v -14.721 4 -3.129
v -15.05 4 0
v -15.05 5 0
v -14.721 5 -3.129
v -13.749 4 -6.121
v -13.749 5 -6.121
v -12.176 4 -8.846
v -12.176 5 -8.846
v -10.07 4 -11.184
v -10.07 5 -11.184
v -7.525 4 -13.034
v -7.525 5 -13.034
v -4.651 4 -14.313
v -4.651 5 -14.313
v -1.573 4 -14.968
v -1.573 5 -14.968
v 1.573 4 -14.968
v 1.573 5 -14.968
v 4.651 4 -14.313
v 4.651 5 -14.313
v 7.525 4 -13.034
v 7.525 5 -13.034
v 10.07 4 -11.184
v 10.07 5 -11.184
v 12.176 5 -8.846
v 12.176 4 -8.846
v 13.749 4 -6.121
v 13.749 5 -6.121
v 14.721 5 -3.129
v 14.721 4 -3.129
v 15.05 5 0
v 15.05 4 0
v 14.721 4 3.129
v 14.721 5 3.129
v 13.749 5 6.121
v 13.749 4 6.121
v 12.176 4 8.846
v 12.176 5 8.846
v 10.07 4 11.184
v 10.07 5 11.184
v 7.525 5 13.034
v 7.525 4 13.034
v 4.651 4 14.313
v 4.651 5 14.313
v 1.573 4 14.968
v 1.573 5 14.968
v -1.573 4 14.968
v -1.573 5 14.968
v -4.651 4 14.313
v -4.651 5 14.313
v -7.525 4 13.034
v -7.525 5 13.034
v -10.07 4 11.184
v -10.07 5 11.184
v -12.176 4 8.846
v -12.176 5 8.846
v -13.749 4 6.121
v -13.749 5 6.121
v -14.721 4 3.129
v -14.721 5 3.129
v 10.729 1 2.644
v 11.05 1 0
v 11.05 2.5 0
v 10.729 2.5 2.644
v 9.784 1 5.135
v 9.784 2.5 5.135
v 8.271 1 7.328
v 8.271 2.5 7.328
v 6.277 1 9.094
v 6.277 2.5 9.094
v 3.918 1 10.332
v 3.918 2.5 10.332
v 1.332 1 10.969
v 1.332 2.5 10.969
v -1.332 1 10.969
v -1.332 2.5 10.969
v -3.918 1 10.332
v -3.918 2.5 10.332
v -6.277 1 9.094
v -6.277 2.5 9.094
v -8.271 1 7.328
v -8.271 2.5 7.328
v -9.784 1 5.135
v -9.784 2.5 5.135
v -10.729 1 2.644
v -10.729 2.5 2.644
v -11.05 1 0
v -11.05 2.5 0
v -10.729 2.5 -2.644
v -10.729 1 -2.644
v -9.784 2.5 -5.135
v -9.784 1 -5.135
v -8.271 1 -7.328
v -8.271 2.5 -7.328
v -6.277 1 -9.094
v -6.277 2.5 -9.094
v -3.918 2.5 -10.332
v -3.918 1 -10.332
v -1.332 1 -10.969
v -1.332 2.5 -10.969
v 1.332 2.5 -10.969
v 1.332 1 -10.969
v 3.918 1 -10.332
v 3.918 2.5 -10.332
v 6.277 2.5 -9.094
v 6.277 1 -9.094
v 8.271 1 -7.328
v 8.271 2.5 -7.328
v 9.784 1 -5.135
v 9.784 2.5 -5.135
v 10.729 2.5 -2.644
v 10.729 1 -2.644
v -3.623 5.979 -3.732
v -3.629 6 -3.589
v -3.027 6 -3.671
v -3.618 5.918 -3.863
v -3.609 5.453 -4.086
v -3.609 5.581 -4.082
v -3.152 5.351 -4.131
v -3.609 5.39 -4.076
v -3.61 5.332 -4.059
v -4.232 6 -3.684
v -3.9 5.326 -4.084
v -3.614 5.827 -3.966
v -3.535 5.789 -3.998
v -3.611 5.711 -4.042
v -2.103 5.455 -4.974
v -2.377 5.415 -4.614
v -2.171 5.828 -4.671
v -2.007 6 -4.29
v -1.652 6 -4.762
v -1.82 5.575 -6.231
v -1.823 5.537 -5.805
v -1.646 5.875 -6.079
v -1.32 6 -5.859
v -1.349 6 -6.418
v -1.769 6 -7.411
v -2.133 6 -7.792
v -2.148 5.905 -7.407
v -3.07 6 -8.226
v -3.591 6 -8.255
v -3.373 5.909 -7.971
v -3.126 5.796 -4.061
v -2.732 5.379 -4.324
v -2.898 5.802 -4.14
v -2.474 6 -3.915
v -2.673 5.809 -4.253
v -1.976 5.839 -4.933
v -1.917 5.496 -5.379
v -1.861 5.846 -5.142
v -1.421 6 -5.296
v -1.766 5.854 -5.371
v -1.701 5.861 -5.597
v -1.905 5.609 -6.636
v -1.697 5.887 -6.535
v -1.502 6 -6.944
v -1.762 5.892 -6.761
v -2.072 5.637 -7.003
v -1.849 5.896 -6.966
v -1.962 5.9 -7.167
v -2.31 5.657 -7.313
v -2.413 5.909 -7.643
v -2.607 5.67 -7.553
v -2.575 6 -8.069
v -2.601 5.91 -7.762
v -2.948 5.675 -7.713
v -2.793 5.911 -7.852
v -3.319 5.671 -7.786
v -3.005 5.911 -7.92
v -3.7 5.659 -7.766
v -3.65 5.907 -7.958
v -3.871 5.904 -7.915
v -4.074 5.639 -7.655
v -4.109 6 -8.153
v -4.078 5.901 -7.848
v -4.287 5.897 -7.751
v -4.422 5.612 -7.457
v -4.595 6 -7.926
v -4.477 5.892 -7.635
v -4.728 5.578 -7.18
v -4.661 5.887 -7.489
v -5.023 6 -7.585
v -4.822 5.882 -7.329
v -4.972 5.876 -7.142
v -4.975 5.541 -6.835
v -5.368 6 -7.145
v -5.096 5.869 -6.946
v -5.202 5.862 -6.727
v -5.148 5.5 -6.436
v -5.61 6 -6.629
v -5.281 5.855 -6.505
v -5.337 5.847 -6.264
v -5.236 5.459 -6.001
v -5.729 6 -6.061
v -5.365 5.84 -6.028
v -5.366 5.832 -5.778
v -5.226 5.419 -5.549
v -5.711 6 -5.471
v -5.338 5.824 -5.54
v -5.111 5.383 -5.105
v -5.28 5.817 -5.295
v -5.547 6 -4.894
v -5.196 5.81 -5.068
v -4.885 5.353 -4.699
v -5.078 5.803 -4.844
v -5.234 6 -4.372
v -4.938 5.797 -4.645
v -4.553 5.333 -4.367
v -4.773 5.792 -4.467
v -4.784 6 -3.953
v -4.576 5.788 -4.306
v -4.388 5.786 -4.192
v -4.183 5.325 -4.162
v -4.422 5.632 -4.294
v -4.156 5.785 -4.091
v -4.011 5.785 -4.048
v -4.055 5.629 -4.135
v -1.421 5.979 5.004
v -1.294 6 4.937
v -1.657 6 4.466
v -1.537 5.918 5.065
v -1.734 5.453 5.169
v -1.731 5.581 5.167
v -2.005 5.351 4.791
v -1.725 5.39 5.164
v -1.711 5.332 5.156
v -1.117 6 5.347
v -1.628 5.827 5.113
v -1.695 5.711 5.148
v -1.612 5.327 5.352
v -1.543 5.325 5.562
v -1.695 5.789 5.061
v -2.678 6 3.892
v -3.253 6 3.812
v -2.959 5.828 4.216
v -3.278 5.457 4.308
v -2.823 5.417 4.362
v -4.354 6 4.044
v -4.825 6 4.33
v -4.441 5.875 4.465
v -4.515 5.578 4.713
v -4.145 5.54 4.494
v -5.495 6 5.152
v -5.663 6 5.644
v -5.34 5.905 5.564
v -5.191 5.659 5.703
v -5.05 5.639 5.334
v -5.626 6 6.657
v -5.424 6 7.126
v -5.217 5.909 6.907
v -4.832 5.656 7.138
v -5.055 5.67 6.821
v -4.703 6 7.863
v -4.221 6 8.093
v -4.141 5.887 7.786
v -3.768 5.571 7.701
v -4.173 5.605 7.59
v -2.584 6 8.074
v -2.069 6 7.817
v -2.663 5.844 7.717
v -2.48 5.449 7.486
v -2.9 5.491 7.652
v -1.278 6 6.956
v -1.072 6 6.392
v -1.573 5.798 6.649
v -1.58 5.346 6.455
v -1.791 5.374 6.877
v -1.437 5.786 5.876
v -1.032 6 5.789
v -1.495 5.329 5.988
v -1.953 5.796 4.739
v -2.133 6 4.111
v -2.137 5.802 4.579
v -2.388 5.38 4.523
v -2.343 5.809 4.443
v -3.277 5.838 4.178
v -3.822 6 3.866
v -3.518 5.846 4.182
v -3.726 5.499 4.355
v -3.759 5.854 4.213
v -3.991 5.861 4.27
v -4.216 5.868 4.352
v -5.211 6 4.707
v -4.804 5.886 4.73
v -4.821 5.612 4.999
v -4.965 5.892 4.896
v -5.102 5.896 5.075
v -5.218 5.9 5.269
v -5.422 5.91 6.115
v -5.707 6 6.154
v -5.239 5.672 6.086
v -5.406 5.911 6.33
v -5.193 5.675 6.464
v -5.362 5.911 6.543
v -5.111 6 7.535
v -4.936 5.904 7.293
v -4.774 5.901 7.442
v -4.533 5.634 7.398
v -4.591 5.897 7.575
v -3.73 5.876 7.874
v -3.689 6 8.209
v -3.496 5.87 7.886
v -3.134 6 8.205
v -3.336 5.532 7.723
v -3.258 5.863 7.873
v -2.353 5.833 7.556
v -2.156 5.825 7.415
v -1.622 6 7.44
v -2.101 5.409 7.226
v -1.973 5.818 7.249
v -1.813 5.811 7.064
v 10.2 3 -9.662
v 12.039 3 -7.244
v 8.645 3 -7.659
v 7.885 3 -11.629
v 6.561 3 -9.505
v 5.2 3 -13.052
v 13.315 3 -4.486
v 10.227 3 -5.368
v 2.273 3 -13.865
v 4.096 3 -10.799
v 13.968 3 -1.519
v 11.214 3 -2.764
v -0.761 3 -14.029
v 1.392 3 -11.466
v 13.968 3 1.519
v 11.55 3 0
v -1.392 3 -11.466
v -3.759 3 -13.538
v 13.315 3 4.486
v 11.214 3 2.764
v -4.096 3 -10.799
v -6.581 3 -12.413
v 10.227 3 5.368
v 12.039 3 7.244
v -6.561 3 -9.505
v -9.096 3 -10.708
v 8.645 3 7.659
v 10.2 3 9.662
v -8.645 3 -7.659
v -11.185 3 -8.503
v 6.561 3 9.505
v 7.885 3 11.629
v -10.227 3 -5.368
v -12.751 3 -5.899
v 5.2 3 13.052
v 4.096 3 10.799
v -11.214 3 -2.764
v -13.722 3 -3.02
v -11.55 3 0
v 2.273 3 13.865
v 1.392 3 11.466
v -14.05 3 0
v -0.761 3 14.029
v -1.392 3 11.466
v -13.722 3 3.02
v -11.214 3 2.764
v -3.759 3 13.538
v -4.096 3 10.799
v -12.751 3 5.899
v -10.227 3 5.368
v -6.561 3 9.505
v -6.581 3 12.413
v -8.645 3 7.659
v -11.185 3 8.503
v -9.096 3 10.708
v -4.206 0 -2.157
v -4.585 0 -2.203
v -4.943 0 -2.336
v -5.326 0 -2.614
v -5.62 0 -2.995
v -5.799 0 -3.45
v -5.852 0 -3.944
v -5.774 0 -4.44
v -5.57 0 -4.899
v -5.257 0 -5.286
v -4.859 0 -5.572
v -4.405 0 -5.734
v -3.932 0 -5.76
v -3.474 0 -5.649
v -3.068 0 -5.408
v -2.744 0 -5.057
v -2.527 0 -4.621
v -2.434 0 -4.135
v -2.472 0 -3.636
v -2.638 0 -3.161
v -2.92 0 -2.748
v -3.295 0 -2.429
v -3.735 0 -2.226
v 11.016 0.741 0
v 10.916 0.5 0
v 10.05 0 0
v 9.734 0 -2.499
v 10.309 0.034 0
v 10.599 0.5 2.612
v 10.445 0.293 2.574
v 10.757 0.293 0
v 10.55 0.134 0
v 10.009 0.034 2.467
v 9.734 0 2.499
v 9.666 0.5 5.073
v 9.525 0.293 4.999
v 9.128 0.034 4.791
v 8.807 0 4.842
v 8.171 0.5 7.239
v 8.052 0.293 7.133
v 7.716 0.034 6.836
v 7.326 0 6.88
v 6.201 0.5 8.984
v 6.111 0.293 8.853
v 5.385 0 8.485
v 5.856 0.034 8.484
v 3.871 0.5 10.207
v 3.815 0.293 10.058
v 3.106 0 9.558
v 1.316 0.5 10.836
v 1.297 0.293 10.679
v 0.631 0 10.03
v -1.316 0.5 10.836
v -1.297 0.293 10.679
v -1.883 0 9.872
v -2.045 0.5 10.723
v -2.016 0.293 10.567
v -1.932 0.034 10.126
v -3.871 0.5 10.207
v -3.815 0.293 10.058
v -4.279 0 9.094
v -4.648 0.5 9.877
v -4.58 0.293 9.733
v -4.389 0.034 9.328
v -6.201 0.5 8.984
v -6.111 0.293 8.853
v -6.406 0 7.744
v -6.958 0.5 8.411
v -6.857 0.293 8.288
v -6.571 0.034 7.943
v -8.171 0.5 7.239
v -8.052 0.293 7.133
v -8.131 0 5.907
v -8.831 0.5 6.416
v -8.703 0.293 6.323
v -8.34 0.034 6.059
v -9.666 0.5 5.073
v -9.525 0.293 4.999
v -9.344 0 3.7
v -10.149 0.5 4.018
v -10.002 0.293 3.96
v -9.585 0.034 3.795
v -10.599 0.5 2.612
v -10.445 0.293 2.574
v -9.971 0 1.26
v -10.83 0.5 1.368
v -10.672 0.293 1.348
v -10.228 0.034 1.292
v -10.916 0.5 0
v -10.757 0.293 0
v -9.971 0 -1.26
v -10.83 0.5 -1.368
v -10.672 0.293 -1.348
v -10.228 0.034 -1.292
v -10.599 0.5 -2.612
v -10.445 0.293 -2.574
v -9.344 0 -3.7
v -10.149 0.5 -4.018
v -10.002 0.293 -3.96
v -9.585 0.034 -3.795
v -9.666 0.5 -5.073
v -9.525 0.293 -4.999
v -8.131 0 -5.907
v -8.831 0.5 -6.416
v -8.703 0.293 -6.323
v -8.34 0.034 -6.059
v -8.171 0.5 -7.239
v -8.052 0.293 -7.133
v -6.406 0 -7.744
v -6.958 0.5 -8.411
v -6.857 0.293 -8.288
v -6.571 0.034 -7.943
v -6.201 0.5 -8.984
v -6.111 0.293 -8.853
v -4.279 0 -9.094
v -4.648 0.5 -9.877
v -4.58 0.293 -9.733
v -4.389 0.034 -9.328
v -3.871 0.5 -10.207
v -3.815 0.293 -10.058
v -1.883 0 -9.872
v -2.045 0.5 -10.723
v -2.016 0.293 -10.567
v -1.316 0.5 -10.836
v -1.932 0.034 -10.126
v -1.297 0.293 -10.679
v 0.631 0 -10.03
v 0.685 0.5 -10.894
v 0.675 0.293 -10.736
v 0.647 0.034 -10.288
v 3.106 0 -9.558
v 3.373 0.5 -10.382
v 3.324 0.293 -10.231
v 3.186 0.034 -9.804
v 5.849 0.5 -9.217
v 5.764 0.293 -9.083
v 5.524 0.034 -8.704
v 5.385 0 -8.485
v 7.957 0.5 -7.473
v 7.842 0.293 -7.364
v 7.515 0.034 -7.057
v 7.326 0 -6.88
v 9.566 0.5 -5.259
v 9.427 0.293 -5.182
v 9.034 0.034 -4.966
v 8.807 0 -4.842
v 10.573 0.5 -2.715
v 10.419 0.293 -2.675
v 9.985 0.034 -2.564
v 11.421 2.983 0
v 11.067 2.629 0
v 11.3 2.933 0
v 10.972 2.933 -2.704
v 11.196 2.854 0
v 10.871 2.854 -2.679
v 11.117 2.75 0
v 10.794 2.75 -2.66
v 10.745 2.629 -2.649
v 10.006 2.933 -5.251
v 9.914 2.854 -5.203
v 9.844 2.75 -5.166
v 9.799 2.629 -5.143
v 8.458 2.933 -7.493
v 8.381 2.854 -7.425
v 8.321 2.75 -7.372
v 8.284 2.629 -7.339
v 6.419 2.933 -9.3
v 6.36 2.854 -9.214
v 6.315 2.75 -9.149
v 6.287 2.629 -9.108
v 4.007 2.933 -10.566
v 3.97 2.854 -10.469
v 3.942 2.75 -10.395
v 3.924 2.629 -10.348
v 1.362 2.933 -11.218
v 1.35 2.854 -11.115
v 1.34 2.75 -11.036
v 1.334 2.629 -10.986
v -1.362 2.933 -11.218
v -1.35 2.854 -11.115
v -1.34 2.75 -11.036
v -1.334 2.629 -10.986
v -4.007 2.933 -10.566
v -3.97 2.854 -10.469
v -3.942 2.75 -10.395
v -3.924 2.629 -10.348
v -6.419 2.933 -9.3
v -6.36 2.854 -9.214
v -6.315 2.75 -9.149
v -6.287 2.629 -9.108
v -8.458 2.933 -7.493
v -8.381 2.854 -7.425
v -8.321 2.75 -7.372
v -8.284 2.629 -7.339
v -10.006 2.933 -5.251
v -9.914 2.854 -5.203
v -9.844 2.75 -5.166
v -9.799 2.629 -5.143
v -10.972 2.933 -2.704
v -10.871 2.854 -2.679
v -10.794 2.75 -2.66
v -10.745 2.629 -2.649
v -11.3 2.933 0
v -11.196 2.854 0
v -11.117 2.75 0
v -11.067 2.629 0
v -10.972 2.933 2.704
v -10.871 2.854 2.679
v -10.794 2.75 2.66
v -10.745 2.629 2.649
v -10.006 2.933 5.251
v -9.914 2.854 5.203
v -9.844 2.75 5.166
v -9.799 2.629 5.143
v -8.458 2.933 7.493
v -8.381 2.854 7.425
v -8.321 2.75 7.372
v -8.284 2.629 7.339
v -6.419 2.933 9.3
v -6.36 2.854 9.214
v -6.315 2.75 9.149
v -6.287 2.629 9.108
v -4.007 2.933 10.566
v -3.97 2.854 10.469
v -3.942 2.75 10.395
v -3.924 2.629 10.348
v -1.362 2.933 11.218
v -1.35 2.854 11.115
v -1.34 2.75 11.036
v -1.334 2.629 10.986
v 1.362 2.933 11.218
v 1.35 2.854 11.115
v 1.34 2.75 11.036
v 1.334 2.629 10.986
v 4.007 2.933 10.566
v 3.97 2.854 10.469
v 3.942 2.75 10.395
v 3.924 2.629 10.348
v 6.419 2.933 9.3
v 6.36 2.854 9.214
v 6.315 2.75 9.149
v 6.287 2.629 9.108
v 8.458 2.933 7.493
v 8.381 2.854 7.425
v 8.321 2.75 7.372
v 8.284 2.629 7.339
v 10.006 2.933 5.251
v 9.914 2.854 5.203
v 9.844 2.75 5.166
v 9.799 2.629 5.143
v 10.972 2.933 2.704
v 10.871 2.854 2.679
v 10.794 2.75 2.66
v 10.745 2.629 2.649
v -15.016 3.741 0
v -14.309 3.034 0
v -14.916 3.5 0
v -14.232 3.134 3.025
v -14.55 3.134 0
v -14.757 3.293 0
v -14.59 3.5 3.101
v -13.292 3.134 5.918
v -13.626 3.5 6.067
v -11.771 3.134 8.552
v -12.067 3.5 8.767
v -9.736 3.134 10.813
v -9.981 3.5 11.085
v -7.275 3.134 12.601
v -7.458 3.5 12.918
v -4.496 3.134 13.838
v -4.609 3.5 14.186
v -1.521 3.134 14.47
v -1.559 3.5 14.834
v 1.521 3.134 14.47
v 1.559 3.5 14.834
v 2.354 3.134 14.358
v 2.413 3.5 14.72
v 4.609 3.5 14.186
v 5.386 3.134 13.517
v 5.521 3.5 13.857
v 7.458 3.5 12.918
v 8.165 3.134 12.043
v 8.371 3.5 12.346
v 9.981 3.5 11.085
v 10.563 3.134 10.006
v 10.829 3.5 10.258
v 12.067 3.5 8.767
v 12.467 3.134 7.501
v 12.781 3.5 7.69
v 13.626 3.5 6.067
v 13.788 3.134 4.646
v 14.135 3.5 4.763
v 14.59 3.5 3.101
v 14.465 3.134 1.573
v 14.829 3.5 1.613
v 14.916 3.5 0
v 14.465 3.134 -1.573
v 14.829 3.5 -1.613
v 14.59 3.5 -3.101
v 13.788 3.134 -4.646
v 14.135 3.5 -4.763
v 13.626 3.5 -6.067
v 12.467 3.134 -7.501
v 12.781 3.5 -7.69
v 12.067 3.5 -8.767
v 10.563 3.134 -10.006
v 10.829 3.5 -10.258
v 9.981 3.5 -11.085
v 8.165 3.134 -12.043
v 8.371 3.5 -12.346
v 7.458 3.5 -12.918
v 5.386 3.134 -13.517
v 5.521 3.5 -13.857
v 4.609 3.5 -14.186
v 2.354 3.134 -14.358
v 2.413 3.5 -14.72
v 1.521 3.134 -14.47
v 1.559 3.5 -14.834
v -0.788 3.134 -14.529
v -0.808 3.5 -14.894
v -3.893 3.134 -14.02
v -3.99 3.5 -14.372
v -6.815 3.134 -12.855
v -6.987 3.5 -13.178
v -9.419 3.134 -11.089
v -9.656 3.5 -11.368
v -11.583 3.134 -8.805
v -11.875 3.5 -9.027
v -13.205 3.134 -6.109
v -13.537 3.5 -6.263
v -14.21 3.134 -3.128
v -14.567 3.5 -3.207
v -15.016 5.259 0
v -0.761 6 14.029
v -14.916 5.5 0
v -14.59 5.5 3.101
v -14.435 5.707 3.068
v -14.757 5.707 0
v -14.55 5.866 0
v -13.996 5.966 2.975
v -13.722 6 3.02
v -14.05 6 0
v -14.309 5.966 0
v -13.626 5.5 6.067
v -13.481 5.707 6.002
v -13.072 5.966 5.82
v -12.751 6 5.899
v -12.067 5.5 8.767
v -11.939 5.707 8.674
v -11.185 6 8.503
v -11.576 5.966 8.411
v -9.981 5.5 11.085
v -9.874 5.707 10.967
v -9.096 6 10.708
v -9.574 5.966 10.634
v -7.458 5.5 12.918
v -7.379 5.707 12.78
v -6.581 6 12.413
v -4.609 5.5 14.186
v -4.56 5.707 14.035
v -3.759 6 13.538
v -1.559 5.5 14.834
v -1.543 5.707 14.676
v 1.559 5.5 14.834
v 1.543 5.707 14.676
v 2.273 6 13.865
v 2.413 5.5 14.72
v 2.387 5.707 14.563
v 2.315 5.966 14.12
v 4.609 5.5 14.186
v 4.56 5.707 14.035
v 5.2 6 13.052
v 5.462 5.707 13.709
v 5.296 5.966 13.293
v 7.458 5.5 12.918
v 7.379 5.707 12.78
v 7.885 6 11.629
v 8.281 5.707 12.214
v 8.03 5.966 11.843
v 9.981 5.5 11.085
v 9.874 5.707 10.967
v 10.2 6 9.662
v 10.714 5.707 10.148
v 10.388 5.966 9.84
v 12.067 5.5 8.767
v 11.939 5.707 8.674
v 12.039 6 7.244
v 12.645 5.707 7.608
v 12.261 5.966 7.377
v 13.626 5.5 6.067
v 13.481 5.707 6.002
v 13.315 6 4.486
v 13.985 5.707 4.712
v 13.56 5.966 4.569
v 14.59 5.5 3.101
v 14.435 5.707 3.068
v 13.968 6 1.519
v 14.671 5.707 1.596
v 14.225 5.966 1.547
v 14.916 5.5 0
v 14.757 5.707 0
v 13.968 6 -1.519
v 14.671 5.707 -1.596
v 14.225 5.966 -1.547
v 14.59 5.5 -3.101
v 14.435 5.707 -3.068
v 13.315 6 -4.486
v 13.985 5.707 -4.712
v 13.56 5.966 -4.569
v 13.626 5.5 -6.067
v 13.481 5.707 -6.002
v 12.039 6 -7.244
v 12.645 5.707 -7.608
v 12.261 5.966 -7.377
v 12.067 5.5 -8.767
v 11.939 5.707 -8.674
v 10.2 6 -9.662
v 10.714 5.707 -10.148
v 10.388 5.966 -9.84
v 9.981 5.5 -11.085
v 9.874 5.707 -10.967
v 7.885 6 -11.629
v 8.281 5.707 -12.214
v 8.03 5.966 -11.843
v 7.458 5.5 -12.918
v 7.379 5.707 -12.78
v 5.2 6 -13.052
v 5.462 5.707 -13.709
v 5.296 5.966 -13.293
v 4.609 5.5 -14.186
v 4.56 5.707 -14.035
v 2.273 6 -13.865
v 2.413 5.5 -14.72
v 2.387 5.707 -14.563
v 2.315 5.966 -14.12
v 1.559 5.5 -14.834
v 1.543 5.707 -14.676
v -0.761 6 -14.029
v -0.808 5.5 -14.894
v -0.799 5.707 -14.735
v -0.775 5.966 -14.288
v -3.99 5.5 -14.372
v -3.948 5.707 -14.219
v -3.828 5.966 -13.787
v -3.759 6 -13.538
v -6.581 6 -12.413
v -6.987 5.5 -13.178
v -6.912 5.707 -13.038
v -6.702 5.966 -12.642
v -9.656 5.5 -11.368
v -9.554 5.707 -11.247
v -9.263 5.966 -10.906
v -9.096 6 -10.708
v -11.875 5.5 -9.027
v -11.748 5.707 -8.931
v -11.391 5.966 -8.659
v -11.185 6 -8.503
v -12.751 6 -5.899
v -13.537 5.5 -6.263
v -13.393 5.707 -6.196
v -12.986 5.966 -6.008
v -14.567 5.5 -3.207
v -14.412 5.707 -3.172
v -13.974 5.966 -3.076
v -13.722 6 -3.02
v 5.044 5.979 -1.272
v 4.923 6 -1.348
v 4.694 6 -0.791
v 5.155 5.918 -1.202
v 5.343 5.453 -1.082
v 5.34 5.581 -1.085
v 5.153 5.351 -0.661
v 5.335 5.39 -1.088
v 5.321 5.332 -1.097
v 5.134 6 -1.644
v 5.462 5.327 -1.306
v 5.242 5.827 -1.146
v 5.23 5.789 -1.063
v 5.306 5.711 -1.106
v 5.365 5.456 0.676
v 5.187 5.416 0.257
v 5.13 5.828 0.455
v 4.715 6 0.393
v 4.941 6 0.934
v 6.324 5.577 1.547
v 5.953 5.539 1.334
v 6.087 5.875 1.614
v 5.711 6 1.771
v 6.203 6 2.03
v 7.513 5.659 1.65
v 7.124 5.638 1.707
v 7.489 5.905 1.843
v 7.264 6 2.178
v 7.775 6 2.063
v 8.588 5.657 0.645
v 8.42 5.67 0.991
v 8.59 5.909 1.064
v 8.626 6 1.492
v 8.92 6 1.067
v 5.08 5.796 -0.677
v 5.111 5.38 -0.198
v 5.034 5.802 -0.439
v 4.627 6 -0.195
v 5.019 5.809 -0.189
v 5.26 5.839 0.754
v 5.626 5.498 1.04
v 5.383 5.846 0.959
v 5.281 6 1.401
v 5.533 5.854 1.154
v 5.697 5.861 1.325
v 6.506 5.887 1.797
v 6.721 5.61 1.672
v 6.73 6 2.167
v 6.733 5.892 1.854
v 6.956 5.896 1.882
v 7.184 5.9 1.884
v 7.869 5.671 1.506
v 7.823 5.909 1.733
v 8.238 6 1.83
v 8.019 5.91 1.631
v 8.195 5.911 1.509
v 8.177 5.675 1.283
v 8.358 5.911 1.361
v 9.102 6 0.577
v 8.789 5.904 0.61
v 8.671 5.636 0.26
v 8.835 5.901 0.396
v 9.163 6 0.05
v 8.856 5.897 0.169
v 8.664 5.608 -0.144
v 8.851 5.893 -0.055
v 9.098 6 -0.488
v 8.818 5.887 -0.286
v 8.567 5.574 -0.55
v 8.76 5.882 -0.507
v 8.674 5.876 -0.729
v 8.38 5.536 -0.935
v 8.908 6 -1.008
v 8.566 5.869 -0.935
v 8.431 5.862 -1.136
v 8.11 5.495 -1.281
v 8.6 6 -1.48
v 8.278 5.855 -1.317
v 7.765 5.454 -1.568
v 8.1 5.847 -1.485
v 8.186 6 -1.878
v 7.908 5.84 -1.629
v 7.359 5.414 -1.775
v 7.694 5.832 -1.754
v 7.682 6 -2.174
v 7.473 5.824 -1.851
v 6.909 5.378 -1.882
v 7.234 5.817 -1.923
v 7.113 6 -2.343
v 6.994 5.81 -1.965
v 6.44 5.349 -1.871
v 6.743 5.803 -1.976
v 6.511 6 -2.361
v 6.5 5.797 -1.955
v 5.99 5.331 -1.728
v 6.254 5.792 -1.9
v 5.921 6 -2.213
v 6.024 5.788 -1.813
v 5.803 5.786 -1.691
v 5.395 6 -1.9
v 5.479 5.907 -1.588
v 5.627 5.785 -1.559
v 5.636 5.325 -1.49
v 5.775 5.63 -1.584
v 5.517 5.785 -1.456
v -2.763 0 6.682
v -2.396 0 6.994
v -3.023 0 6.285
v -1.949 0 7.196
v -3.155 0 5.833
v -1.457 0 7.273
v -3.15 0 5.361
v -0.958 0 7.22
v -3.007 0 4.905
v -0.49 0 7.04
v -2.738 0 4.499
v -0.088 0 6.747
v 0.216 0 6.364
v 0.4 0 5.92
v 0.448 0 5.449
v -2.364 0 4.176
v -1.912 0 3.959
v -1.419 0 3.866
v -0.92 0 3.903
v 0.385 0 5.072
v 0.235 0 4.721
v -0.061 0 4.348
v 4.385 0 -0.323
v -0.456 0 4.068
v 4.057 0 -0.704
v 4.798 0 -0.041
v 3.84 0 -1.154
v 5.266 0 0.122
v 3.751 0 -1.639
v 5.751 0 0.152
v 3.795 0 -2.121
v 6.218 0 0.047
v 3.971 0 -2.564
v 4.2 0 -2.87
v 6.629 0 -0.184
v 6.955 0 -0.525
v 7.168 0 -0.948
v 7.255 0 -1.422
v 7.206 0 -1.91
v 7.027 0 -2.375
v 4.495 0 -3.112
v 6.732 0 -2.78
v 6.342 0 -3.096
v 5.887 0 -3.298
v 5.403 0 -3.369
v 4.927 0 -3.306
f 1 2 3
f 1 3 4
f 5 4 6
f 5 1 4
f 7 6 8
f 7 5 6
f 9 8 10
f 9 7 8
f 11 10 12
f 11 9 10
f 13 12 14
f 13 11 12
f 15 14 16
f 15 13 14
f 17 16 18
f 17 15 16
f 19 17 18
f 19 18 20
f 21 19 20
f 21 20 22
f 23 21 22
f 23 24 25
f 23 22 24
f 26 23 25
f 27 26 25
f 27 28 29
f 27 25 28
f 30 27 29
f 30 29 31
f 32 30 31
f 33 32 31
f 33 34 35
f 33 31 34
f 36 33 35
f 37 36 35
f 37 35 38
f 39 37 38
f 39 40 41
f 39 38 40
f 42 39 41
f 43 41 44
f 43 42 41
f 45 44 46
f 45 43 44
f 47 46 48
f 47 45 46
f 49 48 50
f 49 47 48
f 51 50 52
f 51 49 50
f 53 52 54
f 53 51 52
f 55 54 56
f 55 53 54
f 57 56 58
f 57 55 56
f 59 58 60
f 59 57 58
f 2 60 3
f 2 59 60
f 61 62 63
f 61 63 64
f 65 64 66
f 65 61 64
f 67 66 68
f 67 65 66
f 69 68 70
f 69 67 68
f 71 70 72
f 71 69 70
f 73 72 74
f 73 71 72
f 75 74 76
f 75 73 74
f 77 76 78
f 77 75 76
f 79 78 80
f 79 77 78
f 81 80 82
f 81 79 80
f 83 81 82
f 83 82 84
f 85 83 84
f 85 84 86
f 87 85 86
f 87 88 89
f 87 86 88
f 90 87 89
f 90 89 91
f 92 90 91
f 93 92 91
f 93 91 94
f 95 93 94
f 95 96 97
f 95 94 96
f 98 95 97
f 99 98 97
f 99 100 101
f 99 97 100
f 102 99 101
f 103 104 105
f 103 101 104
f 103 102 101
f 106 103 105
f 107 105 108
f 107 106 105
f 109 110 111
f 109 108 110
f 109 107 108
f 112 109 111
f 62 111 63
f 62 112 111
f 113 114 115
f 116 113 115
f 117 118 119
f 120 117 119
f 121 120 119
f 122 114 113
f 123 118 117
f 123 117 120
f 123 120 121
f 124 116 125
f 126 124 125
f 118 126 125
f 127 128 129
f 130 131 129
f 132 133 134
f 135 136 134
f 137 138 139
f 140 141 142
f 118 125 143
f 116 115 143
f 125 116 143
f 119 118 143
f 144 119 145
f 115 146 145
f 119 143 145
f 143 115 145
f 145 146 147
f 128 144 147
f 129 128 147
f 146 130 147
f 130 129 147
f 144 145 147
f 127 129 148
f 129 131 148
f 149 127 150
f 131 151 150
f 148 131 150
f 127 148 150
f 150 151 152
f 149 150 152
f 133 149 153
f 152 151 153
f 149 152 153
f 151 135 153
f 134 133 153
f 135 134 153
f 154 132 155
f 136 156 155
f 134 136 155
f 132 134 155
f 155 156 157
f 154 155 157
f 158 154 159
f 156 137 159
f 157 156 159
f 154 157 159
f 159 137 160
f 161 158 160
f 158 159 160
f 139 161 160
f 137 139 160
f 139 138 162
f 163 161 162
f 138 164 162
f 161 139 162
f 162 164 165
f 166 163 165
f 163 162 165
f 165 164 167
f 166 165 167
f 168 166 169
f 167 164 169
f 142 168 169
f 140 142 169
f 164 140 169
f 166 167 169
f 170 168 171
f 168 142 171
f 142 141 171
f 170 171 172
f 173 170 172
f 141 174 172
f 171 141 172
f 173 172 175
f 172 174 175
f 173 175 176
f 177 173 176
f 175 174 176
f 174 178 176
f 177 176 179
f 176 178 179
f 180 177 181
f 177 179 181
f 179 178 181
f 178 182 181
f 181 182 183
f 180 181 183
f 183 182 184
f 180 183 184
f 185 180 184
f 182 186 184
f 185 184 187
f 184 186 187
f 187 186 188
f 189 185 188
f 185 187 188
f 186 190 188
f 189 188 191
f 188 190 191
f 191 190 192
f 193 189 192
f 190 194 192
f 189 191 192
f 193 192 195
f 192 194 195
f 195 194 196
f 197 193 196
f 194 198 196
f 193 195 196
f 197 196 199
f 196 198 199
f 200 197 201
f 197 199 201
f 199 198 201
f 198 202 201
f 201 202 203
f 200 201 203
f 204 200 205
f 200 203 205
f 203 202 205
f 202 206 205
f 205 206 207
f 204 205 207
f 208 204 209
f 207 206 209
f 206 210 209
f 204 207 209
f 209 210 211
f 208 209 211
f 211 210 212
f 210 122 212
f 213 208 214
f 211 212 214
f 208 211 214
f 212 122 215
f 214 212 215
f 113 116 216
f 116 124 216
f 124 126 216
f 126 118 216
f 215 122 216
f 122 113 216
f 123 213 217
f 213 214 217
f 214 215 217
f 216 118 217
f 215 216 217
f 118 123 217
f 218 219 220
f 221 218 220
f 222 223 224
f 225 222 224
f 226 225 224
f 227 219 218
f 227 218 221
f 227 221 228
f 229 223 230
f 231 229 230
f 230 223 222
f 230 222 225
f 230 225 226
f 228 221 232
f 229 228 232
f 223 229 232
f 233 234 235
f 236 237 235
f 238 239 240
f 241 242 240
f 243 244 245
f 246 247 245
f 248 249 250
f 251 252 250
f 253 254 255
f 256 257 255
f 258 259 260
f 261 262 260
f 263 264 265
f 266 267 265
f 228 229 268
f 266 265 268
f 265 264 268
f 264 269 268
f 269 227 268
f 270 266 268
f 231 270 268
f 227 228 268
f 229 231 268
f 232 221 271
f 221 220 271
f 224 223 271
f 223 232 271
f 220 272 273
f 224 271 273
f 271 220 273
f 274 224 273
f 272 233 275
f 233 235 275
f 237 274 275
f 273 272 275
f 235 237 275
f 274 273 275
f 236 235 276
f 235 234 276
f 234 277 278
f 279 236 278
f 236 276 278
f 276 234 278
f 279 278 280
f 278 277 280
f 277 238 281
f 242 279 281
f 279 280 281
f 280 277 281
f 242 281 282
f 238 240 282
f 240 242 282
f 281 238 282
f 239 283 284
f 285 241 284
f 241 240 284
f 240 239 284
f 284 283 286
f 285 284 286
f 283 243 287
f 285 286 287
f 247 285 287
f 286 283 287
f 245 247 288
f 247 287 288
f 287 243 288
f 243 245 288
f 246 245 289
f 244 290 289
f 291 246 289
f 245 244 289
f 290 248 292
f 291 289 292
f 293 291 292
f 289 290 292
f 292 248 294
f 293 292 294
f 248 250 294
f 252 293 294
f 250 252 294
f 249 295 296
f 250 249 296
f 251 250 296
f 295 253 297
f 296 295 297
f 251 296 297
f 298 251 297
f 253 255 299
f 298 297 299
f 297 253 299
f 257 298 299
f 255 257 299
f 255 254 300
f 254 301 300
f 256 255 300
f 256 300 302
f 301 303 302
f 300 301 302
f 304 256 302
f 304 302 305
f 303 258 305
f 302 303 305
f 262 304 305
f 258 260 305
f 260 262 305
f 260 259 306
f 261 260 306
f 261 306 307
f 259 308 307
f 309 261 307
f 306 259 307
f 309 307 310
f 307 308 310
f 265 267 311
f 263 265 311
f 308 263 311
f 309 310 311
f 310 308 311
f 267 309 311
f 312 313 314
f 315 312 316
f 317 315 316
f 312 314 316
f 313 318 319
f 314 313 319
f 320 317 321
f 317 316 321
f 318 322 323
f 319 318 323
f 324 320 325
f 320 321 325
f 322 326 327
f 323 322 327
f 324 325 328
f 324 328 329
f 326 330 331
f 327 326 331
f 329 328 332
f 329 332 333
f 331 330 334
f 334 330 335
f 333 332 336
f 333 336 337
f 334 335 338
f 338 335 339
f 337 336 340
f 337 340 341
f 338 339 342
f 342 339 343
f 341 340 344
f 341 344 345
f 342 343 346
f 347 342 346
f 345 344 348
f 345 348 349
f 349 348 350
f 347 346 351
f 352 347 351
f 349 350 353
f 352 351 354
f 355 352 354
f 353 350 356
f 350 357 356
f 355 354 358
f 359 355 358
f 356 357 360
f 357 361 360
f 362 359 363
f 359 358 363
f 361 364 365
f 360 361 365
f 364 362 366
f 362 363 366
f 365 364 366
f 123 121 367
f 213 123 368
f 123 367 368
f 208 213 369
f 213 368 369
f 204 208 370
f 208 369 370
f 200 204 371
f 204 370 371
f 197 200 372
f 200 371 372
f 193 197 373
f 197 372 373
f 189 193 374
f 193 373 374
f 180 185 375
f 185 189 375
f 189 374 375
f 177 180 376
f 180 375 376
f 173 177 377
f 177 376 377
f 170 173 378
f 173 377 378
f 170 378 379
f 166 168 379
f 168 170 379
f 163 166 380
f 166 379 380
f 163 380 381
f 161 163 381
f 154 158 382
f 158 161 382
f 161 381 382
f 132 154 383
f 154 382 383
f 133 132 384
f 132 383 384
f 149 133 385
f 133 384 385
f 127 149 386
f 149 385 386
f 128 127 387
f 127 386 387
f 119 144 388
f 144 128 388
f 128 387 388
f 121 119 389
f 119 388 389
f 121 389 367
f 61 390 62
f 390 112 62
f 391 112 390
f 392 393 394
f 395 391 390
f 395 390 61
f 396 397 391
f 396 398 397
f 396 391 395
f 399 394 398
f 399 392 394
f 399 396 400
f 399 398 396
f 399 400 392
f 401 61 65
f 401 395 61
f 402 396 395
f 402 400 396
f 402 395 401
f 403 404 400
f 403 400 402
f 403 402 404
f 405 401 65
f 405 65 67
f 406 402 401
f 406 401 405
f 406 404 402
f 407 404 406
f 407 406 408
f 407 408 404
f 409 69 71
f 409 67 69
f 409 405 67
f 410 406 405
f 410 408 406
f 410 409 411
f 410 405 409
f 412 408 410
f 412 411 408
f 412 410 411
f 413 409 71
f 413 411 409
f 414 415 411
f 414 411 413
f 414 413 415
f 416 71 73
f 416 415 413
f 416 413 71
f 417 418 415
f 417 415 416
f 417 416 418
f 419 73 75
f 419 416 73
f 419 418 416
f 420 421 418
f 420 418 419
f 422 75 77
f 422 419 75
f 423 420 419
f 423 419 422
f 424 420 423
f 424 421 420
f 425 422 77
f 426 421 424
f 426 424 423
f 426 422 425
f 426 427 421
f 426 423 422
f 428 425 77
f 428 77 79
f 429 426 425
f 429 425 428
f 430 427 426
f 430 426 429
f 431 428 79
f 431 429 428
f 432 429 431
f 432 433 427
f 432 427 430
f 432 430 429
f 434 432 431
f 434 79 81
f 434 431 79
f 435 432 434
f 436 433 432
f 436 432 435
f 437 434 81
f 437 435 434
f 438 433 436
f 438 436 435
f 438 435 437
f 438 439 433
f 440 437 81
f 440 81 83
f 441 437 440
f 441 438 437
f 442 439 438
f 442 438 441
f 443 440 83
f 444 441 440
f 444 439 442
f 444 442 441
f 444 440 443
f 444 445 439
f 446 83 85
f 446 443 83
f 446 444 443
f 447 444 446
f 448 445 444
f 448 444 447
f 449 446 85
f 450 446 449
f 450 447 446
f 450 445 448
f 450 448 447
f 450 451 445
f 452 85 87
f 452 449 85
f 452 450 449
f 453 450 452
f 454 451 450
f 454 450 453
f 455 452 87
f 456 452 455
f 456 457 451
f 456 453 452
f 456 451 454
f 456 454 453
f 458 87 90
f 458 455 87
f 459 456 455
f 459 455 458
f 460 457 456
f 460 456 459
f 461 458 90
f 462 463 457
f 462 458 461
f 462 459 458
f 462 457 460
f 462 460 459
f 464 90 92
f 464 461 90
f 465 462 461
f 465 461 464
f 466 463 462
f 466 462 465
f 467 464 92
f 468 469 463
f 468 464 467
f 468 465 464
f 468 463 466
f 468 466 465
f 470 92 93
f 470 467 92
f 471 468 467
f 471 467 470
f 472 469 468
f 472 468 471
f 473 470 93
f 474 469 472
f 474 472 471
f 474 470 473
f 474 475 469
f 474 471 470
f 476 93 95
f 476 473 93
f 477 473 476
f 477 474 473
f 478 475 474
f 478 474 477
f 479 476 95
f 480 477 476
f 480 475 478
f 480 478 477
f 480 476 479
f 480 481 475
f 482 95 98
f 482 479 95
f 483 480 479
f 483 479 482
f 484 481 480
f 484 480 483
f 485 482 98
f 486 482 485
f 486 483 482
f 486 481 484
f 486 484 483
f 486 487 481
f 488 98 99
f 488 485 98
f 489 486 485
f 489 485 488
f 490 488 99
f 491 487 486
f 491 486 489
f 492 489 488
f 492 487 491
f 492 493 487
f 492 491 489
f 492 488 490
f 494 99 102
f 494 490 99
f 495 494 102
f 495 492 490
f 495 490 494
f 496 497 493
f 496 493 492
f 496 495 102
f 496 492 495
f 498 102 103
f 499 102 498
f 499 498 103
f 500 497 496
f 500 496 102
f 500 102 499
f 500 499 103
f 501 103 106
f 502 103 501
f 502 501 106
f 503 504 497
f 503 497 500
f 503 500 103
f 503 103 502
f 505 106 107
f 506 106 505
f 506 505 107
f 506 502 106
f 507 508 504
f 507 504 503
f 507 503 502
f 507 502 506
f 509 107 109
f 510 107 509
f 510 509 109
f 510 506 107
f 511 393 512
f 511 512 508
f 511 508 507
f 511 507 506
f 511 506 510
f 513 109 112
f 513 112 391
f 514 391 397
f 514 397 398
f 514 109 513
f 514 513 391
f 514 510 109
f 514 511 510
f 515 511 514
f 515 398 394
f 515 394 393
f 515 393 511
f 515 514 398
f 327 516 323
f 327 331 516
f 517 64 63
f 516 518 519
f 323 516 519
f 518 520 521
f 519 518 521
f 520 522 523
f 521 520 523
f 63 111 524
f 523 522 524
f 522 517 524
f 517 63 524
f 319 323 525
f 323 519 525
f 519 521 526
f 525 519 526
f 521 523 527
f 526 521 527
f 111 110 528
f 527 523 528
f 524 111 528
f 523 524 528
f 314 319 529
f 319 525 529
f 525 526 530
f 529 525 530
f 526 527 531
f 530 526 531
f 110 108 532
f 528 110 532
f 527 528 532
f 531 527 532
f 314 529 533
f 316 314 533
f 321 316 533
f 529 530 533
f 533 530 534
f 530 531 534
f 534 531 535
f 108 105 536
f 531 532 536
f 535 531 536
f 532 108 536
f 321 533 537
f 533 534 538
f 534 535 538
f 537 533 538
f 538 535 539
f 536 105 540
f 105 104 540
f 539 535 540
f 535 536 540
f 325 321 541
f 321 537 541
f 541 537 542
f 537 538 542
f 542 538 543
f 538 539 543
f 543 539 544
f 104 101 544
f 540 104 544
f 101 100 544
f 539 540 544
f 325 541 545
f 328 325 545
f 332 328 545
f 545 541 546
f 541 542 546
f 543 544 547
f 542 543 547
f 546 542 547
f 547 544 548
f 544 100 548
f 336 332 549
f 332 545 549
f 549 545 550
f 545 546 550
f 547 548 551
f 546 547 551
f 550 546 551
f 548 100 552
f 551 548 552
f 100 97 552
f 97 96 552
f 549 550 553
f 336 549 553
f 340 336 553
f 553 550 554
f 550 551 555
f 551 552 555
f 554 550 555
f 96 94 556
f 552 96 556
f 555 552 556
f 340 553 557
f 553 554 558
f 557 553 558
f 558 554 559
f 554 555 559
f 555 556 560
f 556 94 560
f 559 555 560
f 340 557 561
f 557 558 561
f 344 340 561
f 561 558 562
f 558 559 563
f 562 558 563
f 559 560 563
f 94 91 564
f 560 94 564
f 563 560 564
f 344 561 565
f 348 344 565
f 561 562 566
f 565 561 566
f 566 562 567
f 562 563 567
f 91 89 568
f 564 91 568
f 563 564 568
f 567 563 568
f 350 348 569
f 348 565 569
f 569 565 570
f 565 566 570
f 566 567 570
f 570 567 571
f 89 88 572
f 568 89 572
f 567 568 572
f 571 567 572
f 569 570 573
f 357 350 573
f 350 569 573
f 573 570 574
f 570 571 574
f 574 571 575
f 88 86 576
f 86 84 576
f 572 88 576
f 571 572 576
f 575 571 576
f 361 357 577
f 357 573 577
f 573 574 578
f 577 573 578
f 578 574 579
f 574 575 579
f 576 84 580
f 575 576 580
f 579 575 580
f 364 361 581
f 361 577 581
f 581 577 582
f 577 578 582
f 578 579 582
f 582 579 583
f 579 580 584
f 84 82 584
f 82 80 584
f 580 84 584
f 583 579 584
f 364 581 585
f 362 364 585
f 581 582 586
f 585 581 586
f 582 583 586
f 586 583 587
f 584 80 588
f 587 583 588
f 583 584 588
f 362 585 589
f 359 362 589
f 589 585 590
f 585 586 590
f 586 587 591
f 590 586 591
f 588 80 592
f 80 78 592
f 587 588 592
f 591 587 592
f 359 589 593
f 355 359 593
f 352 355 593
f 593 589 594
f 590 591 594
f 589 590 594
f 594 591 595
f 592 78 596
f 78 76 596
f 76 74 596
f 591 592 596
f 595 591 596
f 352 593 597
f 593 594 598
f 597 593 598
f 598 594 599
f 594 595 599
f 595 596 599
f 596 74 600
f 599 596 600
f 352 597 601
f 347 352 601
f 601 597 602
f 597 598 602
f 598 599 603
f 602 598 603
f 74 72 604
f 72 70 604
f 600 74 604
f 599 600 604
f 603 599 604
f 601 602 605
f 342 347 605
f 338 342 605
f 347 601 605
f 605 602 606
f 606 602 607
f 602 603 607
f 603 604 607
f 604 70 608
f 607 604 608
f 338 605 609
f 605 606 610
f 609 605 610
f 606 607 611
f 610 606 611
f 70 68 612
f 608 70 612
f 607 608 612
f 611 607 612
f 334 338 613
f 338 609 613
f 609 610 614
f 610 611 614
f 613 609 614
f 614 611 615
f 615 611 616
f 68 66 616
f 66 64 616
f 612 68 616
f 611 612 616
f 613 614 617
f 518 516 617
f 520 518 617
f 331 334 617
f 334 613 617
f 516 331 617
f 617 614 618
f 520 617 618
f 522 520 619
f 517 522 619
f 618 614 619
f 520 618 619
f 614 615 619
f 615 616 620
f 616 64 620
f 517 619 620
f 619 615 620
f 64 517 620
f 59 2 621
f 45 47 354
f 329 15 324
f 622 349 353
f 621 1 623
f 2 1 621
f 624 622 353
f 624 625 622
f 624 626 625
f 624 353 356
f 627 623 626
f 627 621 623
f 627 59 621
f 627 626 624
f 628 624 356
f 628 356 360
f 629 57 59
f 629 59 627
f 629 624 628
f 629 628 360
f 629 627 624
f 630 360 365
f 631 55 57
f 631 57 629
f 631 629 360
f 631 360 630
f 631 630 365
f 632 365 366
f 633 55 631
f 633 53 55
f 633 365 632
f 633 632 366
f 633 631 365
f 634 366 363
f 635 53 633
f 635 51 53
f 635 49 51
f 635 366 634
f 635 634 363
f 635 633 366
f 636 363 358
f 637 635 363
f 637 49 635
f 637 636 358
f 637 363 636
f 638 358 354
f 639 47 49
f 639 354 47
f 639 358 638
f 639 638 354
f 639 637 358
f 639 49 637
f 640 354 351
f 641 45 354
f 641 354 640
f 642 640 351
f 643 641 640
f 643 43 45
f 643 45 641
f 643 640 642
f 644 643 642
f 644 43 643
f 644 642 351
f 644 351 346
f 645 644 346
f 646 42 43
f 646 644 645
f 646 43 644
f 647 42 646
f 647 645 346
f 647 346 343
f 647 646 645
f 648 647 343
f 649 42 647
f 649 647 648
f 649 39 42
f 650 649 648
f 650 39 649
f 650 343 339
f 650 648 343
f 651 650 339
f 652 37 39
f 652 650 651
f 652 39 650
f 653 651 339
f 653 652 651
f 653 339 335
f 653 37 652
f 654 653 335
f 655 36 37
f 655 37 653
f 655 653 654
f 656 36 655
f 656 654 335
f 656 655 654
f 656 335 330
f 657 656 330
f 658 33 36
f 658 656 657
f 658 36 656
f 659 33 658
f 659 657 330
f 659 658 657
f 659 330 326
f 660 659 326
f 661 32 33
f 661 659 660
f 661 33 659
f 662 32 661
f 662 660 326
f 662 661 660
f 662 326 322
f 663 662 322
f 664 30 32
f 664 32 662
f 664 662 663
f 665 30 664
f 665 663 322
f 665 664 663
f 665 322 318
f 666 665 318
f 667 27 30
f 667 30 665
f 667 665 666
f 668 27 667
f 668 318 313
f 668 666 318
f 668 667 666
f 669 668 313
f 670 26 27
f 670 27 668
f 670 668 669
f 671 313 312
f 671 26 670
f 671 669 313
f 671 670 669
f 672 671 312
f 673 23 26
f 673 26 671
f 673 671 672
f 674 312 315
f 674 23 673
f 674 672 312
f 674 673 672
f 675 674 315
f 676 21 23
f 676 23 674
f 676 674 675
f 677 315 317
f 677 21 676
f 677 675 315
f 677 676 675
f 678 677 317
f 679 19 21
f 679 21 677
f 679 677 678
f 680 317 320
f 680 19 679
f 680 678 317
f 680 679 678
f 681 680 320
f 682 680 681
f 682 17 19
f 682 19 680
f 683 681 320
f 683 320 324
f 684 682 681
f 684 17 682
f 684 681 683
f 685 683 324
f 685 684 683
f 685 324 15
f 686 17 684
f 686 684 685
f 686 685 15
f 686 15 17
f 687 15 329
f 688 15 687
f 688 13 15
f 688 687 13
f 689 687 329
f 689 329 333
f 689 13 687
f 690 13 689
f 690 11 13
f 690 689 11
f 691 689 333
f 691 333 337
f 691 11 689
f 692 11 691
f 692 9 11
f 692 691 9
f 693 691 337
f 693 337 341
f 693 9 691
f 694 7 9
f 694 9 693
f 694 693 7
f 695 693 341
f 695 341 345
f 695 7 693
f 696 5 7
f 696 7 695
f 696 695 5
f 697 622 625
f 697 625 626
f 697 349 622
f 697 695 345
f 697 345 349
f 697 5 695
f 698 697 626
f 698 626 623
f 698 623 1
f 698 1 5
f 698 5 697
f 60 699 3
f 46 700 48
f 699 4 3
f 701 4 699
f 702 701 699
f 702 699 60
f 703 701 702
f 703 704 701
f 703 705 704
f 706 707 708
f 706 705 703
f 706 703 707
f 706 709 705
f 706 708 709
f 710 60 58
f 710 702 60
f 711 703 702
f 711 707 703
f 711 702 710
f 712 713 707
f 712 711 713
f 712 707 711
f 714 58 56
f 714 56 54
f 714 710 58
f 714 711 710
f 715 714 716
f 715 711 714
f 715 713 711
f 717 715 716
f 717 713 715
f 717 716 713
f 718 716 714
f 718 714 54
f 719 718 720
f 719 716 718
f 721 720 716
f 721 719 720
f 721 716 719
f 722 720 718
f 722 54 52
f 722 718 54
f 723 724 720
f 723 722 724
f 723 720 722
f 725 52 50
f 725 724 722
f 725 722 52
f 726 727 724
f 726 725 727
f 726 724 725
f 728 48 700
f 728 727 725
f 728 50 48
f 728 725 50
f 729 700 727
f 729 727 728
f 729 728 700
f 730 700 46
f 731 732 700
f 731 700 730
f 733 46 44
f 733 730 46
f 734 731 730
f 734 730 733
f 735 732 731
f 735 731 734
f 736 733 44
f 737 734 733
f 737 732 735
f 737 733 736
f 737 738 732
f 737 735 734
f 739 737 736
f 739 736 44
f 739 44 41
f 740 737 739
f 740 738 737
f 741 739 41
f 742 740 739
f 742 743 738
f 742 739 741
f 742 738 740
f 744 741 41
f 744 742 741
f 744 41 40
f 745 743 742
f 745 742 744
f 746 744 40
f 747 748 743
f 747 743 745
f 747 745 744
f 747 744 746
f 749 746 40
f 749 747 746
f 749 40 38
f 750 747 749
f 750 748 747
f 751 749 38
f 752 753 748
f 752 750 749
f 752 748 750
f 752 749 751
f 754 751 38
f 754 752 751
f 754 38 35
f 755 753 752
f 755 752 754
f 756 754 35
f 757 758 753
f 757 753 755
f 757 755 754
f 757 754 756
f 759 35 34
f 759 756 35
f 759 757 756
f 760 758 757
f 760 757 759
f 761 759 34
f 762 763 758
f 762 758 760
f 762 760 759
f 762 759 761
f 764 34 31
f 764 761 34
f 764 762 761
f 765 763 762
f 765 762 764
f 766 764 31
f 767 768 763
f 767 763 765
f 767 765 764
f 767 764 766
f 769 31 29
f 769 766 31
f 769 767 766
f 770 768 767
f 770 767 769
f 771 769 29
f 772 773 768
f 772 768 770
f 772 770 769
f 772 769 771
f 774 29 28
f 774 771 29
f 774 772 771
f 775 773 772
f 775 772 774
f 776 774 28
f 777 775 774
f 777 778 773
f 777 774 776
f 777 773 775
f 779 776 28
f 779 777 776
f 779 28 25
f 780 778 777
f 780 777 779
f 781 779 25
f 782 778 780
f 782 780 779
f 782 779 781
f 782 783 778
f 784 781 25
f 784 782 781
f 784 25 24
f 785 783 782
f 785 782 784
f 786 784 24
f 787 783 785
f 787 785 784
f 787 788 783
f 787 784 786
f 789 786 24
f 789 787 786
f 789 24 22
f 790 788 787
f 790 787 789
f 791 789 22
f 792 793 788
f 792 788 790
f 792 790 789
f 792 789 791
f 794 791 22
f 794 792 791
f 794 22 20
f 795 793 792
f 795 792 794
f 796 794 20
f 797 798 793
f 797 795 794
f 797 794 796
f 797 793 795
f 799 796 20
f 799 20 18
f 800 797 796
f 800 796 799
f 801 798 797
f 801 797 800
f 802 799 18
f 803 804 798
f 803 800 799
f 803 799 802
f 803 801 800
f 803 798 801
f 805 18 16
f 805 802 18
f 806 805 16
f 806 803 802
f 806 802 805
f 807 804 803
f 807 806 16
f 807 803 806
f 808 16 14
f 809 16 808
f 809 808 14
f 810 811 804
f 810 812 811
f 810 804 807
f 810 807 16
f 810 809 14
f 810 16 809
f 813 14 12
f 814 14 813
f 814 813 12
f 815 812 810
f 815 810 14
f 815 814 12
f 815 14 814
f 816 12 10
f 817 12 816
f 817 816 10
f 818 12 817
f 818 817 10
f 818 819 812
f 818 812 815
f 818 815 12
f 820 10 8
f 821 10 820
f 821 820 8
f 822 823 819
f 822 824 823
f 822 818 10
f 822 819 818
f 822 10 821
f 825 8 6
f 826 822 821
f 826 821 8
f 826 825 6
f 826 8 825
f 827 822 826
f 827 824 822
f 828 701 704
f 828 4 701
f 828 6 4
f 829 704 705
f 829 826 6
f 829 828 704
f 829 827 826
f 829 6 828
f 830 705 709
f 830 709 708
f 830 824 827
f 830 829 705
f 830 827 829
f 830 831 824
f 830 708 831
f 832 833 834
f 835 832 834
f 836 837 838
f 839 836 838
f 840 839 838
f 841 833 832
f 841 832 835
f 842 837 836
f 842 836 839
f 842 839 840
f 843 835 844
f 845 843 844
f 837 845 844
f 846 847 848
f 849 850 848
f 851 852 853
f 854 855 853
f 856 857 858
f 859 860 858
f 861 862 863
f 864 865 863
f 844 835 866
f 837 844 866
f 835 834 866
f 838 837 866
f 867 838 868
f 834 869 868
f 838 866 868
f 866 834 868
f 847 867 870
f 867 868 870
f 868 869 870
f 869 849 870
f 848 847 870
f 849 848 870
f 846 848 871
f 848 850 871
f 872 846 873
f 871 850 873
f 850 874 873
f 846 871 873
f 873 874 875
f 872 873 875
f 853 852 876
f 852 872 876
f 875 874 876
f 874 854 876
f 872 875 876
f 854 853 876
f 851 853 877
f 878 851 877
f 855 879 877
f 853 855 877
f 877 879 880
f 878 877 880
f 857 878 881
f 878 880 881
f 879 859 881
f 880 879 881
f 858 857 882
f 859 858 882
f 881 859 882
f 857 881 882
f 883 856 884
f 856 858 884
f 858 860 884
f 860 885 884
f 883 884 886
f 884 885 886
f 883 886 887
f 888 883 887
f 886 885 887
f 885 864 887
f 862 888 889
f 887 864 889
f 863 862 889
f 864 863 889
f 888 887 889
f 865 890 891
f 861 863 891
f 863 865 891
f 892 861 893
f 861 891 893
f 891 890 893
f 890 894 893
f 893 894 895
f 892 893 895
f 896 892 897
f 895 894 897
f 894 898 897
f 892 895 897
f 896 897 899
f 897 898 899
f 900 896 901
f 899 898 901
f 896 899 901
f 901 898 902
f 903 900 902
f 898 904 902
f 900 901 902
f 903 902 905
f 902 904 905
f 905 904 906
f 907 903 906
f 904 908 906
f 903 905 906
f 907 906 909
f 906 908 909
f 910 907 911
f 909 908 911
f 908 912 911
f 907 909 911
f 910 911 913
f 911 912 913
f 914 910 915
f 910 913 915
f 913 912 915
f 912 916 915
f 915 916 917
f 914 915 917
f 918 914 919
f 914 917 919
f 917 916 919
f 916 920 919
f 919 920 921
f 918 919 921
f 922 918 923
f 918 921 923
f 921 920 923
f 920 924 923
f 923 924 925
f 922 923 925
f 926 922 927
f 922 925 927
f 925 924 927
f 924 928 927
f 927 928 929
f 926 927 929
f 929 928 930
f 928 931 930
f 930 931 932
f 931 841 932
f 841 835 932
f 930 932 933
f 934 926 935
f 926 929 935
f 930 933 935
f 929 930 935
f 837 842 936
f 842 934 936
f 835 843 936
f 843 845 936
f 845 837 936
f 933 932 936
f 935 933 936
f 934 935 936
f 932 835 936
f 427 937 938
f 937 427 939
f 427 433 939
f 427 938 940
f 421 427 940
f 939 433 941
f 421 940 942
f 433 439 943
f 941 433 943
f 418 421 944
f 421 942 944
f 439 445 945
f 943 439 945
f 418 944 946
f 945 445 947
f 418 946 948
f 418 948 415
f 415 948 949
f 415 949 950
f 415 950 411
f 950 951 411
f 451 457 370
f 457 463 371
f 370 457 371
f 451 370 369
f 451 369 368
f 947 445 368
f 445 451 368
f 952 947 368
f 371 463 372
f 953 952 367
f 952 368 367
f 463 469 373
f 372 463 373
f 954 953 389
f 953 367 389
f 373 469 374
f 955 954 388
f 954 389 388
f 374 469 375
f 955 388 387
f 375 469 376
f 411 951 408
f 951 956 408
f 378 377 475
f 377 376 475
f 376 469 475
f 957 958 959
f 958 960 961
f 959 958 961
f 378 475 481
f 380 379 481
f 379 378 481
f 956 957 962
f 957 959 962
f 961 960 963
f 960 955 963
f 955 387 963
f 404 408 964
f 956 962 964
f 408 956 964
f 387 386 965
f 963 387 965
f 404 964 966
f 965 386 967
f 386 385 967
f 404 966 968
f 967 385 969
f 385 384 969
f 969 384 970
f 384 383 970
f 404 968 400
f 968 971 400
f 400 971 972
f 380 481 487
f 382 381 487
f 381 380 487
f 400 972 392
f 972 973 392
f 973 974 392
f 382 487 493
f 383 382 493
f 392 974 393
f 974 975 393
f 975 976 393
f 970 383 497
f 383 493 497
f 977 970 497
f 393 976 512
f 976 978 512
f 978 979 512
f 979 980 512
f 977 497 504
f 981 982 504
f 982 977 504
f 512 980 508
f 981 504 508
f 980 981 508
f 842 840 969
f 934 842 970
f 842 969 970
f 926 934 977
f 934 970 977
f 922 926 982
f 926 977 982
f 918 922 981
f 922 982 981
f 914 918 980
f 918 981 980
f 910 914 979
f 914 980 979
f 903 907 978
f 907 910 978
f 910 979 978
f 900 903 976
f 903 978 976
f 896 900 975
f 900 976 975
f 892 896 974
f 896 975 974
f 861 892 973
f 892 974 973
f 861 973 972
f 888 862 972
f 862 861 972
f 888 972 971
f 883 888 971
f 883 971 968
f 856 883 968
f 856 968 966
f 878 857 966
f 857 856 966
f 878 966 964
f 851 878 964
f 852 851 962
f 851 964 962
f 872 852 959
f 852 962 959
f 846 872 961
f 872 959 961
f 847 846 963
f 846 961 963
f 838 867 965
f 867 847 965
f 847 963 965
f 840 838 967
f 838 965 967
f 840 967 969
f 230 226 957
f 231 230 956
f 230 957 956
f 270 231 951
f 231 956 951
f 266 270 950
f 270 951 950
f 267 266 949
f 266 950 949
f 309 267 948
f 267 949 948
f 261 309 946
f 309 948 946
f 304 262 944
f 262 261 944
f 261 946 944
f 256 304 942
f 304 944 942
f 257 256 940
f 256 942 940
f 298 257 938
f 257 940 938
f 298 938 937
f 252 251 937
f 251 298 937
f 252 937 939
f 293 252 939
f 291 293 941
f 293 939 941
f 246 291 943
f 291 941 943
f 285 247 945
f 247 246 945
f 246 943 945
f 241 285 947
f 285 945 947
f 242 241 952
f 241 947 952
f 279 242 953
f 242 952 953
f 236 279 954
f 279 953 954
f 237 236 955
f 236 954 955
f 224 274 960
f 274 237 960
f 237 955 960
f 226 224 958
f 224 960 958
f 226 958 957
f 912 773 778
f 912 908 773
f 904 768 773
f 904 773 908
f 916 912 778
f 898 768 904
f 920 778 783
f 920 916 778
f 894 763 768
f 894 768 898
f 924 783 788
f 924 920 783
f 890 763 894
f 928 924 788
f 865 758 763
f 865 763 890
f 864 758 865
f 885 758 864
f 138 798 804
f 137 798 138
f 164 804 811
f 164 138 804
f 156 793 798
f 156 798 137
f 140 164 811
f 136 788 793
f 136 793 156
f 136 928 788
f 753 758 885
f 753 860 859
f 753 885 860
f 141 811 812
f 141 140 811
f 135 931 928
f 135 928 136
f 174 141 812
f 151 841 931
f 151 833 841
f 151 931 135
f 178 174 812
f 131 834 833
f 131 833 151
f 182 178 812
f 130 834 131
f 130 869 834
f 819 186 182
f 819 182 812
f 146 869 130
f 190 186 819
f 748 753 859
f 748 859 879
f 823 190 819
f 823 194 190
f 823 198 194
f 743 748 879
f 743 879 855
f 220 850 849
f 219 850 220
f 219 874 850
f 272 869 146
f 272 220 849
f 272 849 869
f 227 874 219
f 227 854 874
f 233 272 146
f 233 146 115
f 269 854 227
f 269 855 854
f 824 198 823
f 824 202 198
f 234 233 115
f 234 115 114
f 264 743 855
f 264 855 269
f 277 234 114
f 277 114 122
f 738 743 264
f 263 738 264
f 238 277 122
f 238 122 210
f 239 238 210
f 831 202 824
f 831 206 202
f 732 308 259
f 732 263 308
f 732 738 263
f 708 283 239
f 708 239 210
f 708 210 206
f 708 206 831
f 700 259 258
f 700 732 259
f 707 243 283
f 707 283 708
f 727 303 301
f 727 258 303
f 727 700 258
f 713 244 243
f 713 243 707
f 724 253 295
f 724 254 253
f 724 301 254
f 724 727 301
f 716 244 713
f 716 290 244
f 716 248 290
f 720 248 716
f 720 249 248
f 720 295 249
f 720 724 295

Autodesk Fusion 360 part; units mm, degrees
sketch "Schizzo1" plane through (0, 0, 0) normal (0, 1, 0) x (1, 0, 0)
  circle A0 centre (0, 0) radius 11.05
  dimension "d1" = 22.1
extrude "Estrusione1" add sketch "Schizzo1" along normal blind 3
sketch "Schizzo2" plane through (0, 3, 0) normal (0, 1, 0) x (-1, 0, 0)
  circle A0 centre (0, 0) radius 11.05
  circle A1 centre (0, 0) radius 15.05
  dimension "d4" = 4
extrude "Estrusione2" add sketch "Schizzo2" along normal blind 3 contours A0 | A1
fillet "Raccordo1" radius 1 3 edges at (14.0315, 6, -5.4423) (14.0315, 3, -5.4423) (-10.3022, 0, 3.9959)
fillet "Raccordo2" radius 0.5 1 edges at (-10.3022, 3, 3.9959)
ref_plane "Piano di lavoro1" through (0, 4.6647, 13.1079) normal (0, -0.3353, -0.9421) x (1, 0, 0)
sketch "Schizzo4" plane through (0, 6, 0) normal (0, 1, 0) x (-1, 0, 0)
  circle A0 centre (0, 0) radius 14.05
  circle A1 centre (-7, 0) radius 1.6
  line L0 (0, 0) -> (-11, 0)
  line L1 (0, 0) -> (5.674, -9.8276)
  line L2 (0, 0) -> (5.674, 9.8276)
  circle A2 centre (3.5, -6.0622) radius 1.6
  circle A3 centre (3.5, 6.0622) radius 1.6
  dimension "d12" = 3.2
  dimension "d13" = 120
  dimension "d14" = 120
ref_plane "Piano di lavoro3" through (-4.0972, 5.9367, 13.0728) normal (0.1047, 0.9367, -0.3342) x (-0.9938, 0.1111, 0)
ref_plane "Piano di lavoro4" through (-1.5836, 28.4168, 5.0526) normal (0.1047, 0.9367, -0.3342) x (-0.9938, 0.1111, 0)
hole "Foratura1" at (-1.6427, 22.361, -11.9401) direction (-0.1047, -0.9367, 0.3342) diameter 3.4 depth 27 tip angle 118
pattern_circular "Serie C1" count 3 over 240 about axis through (0, 3.5, 0) along (0, 1, 0) both ways of "Foratura1"
fillet "Raccordo3" radius 0.5 3 edges at (8.2499, 6, 1.3806) (-5.3206, 6, 6.4543) (-2.9293, 6, -7.8349)
